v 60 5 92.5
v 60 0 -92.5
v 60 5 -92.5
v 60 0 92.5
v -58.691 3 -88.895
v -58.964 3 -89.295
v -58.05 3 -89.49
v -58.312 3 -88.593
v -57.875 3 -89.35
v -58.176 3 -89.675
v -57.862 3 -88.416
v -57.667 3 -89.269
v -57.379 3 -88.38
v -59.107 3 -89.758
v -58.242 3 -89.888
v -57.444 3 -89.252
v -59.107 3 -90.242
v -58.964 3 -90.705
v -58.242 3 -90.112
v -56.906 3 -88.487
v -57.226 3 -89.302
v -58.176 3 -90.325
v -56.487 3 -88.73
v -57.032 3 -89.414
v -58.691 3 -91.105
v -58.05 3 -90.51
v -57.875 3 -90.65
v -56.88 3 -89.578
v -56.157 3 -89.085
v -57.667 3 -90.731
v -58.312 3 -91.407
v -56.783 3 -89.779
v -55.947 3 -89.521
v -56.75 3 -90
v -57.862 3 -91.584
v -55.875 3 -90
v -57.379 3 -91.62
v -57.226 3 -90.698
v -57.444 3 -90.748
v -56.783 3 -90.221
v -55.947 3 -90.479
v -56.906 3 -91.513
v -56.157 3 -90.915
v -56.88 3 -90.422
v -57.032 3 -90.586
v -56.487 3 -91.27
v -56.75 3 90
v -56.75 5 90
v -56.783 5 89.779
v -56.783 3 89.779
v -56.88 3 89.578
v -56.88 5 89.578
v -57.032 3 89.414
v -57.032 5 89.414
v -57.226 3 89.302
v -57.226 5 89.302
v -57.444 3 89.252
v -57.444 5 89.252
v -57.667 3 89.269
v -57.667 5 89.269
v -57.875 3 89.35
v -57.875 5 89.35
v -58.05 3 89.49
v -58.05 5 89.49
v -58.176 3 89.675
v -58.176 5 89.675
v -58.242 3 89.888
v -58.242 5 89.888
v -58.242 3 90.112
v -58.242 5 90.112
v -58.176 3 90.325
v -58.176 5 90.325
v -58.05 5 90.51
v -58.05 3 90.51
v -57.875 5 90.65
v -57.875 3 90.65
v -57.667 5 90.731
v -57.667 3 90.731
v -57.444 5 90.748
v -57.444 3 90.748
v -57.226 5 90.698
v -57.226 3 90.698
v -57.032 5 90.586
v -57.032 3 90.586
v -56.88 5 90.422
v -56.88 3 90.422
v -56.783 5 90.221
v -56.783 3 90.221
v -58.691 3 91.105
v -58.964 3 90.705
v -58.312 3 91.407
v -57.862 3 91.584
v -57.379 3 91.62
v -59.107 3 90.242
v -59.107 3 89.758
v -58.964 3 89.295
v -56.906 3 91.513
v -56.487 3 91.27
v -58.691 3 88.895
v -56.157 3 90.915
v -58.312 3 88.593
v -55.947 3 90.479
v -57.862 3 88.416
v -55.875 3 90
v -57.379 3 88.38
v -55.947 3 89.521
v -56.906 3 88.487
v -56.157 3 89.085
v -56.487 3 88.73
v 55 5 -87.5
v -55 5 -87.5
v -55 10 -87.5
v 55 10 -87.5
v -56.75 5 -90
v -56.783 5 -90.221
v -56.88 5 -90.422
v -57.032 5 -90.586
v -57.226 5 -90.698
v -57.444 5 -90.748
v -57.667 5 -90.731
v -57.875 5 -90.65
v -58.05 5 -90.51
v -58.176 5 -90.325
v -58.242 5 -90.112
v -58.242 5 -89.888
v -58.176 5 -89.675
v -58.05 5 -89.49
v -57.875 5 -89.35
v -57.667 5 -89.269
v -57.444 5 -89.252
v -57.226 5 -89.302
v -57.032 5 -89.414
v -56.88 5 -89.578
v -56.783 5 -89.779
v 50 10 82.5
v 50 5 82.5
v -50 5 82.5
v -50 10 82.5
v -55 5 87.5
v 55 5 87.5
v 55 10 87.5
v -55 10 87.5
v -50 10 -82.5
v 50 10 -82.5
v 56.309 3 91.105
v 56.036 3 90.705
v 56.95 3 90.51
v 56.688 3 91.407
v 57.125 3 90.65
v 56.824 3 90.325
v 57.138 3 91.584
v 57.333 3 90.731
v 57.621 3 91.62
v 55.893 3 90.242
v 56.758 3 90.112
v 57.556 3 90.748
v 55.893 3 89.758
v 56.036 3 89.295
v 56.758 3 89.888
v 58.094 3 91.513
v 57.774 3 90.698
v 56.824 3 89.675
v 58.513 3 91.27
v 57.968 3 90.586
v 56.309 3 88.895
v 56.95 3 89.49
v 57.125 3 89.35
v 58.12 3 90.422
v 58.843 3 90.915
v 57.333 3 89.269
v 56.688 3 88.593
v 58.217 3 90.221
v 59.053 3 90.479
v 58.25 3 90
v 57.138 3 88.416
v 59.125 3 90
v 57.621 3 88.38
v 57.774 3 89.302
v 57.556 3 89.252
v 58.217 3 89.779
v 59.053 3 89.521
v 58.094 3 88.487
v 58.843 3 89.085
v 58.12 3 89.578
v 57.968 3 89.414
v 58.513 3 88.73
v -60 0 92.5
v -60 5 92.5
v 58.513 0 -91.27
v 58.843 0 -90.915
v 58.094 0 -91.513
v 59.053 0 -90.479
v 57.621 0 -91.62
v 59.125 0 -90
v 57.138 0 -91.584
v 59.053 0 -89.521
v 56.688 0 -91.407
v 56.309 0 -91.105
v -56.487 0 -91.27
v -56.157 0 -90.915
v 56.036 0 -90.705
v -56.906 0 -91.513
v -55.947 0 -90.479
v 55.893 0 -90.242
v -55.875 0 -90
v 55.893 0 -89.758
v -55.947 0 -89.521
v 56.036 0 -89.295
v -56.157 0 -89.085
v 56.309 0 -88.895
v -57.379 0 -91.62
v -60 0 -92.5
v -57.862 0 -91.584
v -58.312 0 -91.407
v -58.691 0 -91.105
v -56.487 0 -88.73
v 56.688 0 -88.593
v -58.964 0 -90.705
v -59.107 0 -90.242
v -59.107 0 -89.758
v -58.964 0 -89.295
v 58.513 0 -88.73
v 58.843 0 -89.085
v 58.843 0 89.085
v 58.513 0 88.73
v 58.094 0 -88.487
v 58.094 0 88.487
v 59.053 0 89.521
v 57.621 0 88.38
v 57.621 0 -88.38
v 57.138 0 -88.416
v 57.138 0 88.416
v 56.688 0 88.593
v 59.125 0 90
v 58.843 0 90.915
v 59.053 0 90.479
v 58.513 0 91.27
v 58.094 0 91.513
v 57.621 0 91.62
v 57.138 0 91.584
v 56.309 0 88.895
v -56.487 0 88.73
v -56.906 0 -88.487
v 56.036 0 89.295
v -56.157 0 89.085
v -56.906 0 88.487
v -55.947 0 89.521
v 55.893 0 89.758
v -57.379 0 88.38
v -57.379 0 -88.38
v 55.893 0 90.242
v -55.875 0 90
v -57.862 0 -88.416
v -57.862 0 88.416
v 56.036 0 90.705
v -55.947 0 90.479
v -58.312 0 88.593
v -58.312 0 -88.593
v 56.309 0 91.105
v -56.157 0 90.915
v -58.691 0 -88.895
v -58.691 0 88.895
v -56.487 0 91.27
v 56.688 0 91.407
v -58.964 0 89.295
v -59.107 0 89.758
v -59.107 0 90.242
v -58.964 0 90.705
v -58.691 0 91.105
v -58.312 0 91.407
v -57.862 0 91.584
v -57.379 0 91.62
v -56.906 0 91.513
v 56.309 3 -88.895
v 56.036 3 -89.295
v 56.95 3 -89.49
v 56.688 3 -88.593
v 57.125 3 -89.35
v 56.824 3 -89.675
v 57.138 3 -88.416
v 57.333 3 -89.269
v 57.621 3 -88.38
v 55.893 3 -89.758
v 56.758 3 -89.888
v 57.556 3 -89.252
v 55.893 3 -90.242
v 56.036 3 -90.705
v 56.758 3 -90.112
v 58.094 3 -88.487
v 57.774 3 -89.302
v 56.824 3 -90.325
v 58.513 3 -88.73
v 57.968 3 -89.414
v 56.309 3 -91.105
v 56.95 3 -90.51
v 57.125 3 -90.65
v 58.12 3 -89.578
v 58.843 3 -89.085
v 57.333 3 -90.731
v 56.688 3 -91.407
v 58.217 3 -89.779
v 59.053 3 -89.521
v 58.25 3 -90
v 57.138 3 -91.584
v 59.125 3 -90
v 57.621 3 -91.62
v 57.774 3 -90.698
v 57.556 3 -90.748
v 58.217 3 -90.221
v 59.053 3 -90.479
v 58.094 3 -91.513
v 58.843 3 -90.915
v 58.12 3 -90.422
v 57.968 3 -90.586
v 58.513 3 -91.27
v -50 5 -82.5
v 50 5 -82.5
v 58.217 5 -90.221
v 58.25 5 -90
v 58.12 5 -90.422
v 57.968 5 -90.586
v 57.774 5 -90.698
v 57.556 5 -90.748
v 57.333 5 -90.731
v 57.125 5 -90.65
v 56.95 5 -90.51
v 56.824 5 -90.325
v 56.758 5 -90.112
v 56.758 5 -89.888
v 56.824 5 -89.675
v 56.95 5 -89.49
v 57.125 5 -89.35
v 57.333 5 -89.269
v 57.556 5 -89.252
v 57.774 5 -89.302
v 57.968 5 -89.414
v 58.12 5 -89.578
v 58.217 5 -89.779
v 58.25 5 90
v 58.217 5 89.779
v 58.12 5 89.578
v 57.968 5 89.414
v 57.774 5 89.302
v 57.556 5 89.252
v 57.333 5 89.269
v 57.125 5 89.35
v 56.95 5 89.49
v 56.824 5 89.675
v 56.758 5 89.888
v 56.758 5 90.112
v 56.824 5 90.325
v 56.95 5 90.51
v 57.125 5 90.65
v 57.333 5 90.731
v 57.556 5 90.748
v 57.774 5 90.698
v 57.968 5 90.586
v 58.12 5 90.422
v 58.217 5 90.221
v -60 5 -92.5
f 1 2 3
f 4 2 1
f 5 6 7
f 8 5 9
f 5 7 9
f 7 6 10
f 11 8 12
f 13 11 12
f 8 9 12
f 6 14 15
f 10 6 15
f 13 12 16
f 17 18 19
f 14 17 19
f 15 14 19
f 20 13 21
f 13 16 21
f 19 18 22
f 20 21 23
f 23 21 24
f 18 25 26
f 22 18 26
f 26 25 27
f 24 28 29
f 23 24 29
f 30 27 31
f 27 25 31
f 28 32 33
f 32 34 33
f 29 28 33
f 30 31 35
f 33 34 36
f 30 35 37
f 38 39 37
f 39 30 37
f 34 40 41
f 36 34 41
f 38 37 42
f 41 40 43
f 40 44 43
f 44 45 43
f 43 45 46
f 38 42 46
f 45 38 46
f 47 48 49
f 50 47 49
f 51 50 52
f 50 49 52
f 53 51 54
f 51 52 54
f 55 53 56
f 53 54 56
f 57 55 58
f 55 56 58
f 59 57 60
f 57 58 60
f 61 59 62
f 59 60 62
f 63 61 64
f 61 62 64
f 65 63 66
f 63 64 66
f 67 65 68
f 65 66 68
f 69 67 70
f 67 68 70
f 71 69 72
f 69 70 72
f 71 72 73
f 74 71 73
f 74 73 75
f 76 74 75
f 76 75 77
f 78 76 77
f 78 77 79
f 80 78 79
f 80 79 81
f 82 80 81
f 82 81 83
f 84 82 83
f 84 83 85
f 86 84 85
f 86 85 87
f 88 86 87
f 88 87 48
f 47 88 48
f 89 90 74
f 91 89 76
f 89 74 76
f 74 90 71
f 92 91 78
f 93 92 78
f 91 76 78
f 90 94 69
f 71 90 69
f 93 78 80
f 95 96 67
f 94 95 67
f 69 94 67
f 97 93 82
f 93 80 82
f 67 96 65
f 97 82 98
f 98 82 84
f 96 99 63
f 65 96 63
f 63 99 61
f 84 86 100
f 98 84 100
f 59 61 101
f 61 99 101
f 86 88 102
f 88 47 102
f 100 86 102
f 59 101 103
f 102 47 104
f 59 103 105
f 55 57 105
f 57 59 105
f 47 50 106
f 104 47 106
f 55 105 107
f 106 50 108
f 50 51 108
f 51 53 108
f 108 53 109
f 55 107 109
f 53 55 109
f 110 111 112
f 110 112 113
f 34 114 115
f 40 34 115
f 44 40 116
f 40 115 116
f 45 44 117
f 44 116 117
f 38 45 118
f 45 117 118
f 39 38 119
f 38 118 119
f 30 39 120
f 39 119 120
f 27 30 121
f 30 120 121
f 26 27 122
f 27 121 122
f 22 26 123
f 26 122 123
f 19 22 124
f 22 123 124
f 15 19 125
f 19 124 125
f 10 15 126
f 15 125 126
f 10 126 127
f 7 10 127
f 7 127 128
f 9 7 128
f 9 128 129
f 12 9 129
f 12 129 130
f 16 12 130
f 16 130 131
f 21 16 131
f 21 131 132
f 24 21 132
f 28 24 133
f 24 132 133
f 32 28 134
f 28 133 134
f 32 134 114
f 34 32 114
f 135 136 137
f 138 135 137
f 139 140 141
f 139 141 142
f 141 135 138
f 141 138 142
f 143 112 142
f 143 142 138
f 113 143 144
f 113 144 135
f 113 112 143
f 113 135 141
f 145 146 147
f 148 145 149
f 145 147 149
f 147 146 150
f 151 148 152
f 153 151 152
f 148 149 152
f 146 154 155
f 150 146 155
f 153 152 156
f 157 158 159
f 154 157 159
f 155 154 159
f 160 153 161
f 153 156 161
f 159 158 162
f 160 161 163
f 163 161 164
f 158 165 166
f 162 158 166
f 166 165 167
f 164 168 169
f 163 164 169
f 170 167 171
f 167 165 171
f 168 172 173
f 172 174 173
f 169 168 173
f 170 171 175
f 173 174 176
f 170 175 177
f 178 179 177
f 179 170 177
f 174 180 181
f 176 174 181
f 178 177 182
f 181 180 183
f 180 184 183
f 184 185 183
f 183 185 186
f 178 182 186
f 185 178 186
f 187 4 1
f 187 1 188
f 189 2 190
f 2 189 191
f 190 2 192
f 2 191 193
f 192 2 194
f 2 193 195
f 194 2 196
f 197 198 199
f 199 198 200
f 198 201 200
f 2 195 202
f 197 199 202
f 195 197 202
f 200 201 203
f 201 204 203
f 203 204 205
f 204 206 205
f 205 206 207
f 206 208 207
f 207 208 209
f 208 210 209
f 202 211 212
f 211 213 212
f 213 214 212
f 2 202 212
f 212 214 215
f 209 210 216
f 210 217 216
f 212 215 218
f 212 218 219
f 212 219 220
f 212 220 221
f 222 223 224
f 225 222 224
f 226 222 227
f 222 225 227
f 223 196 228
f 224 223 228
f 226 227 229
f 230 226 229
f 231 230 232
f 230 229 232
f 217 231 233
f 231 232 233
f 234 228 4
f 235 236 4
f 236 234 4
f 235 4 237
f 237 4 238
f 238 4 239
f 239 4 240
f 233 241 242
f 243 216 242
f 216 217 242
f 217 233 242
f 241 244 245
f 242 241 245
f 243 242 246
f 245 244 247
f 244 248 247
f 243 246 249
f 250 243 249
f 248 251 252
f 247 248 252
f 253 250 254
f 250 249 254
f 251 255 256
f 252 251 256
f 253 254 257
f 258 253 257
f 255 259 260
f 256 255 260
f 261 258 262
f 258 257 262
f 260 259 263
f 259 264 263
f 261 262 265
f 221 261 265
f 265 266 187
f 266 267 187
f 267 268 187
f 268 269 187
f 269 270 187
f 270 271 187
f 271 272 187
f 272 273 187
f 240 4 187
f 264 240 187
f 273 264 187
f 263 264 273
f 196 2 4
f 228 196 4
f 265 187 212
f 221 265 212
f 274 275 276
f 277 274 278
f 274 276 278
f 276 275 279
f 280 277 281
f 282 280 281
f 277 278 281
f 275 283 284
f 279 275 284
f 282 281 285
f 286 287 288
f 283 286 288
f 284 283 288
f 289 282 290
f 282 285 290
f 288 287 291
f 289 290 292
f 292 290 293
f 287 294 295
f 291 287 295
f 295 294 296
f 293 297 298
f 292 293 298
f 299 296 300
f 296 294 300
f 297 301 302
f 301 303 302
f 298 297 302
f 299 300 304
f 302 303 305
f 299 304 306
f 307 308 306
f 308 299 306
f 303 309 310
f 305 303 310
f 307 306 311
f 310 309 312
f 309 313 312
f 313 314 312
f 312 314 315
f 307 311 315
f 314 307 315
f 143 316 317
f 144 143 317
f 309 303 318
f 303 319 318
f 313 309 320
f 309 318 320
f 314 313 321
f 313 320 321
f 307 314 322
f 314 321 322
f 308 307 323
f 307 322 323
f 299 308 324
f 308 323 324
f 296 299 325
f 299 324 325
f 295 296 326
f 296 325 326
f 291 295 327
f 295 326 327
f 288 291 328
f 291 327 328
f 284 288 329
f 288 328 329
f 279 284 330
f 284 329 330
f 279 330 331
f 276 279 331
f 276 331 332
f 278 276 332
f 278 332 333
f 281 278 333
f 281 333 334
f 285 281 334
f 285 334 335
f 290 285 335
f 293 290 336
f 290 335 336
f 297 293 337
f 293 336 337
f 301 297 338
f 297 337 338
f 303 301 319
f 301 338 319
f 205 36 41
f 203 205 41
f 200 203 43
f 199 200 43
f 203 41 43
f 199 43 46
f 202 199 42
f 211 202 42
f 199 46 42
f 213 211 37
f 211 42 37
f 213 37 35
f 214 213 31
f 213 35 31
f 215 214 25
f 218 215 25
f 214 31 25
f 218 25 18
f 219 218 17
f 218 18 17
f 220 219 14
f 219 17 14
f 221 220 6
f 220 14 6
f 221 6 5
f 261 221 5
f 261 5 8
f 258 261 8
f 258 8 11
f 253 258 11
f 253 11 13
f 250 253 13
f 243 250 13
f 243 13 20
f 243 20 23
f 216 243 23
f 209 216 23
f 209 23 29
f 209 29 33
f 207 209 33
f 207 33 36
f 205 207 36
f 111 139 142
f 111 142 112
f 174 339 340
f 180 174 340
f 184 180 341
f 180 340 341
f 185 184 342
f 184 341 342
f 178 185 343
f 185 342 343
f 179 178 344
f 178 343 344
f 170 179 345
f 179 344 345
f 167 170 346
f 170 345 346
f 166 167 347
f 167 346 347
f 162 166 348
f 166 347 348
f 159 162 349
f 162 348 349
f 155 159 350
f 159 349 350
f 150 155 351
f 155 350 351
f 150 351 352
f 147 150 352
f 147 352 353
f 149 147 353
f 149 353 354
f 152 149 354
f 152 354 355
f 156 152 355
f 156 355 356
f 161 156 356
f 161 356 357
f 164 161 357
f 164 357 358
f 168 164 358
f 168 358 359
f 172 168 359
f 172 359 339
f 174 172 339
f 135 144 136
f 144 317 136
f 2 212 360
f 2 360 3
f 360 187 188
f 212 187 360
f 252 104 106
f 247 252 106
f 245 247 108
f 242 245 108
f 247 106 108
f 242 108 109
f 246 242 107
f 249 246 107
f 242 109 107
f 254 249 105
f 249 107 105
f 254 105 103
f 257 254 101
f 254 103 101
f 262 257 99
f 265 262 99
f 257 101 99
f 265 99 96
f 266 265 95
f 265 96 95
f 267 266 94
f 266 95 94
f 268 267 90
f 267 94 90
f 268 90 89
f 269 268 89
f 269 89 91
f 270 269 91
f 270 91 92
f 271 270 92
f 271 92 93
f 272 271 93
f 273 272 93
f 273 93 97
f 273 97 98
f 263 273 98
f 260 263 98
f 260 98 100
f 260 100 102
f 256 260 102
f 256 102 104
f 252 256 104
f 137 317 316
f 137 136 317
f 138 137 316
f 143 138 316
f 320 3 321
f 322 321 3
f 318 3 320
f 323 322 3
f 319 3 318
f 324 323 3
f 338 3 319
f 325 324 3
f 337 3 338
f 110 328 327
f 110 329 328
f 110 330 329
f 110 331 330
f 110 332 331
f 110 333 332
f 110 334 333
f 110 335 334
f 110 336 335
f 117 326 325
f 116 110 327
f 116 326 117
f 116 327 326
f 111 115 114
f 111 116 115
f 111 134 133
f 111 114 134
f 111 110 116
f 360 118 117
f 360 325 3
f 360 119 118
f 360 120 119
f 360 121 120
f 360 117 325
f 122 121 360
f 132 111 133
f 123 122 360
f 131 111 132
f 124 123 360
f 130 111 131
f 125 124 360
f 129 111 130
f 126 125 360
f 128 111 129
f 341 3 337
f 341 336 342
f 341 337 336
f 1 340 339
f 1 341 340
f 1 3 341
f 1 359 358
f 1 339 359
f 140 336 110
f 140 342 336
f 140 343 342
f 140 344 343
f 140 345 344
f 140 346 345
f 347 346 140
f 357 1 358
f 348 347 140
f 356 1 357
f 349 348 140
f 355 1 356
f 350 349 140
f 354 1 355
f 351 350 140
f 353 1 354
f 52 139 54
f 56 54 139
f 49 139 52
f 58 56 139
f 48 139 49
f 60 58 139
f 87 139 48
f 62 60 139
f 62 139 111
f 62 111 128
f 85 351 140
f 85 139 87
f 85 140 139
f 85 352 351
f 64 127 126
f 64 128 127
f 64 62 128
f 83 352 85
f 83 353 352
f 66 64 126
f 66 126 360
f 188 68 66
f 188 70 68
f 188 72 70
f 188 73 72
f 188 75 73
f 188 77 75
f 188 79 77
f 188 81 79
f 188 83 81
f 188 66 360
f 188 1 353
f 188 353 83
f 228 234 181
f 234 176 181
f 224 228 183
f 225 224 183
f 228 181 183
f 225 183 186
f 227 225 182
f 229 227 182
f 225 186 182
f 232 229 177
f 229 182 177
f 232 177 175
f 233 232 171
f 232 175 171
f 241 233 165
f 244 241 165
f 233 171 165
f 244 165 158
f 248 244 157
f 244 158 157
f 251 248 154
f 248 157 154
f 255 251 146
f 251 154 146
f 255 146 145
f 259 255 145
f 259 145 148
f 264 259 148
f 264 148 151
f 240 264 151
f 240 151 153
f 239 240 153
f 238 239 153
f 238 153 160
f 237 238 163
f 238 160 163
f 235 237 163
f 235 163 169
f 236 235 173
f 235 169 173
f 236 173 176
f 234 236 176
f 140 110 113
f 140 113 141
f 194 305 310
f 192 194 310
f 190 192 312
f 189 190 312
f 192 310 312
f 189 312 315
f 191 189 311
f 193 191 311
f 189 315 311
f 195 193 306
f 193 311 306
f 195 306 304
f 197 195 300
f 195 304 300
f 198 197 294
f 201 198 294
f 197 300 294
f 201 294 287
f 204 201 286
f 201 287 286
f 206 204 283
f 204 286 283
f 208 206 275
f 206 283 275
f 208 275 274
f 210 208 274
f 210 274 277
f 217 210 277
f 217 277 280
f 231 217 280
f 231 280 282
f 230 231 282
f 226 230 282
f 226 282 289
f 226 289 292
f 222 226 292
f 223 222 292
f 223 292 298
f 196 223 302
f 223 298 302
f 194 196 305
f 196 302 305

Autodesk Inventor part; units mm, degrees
ref_plane "YZ Plane" through (0, 0, 0) normal (1, 0, 0) x (0, 1, 0)
ref_plane "XZ Plane" through (0, 0, 0) normal (0, 1, 0) x (-1, 0, 0)
ref_plane "XY Plane" through (0, 0, 0) normal (0, 0, 1) x (1, 0, 0)
sketch "Sketch1" plane through (0, 0, 0) normal (0, 1, 0) x (-1, 0, 0)
  line L0 (-60, 92.5) -> (60, 92.5)
  line L1 (60, 92.5) -> (60, -92.5)
  line L2 (60, -92.5) -> (-60, -92.5)
  line L3 (-60, -92.5) -> (-60, 92.5)
  line L4 (-60, 92.5) -> (60, -92.5) construction
  line L5 (60, 92.5) -> (-60, -92.5) construction
  point P0 (0, 0)
  dimension "d0" = 120
  dimension "d1" = 185
extrude "Extrusion1" add sketch "Sketch1" along normal blind 5
sketch "Sketch2" plane through (0, 5, 0) normal (0, 1, 0) x (1, 0, 0)
  line L0 (55, -87.5) -> (-55, -87.5)
  line L1 (-55, -87.5) -> (-55, 87.5)
  line L2 (-55, 87.5) -> (55, 87.5)
  line L3 (55, 87.5) -> (55, -87.5)
  line L4 (55, -87.5) -> (-55, 87.5) construction
  line L5 (-55, -87.5) -> (55, 87.5) construction
  line L6 (50, -82.5) -> (-50, -82.5)
  line L7 (-50, -82.5) -> (-50, 82.5)
  line L8 (-50, 82.5) -> (50, 82.5)
  line L9 (50, 82.5) -> (50, -82.5)
  line L10 (50, -82.5) -> (-50, 82.5) construction
  line L11 (-50, -82.5) -> (50, 82.5) construction
  point P0 (0, 0)
  dimension "d4" = 110
  dimension "d5" = 175
  dimension "d6" = 100
  dimension "d7" = 165
extrude "Extrusion2" add sketch "Sketch2" along normal blind 5
sketch "Sketch4" plane through (0, 5, 0) normal (0, 1, 0) x (1, 0, 0)
  circle A0 centre (57.5, -90) radius 1.625
  circle A1 centre (57.5, 90) radius 1.625
  circle A2 centre (-57.5, 90) radius 1.625
  circle A3 centre (-57.5, -90) radius 1.625
  point P0 (0, 0)
  dimension "d11" = 3.25
  dimension "d12" = 3.25
  dimension "d13" = 3.25
  dimension "d16" = 3.25
extrude "Extrusion3" cut sketch "Sketch4" against normal blind 5
sketch "Sketch5" plane through (0, 5, 0) normal (0, 1, 0) x (1, 0, 0)
  circle A0 centre (57.5, 90) radius 1.625 projected
  circle A1 centre (57.5, 90) radius 1.625
  circle A2 centre (57.5, -90) radius 1.625 projected
  circle A3 centre (57.5, -90) radius 1.625
  circle A4 centre (-57.5, -90) radius 1.625 projected
  circle A5 centre (-57.5, -90) radius 1.625
  circle A6 centre (-57.5, 90) radius 1.625 projected
  circle A7 centre (-57.5, 90) radius 1.625
  point P0 (0, 0)
extrude "Extrusion4" add sketch "Sketch5" against normal blind 2
sketch "Sketch6" plane through (0, 5, 0) normal (0, 1, 0) x (1, 0, 0)
  circle A0 centre (57.5, 90) radius 1.625 projected
  circle A1 centre (57.5, 90) radius 0.75
  circle A2 centre (57.5, -90) radius 1.625 projected
  circle A3 centre (57.5, -90) radius 0.75
  circle A4 centre (-57.5, -90) radius 1.625 projected
  circle A5 centre (-57.5, -90) radius 0.75
  circle A6 centre (-57.5, 90) radius 1.625 projected
  circle A7 centre (-57.5, 90) radius 0.75
  point P0 (0, 0)
  dimension "d19" = 1.5
  dimension "d20" = 1.5
  dimension "d21" = 1.5
  dimension "d22" = 1.5
extrude "Extrusion5" cut sketch "Sketch6" against normal blind 2 contours A1 | A3 | A5 | A7
properties part number "Enclose Bottom" material "PC/ABS Plastic"
